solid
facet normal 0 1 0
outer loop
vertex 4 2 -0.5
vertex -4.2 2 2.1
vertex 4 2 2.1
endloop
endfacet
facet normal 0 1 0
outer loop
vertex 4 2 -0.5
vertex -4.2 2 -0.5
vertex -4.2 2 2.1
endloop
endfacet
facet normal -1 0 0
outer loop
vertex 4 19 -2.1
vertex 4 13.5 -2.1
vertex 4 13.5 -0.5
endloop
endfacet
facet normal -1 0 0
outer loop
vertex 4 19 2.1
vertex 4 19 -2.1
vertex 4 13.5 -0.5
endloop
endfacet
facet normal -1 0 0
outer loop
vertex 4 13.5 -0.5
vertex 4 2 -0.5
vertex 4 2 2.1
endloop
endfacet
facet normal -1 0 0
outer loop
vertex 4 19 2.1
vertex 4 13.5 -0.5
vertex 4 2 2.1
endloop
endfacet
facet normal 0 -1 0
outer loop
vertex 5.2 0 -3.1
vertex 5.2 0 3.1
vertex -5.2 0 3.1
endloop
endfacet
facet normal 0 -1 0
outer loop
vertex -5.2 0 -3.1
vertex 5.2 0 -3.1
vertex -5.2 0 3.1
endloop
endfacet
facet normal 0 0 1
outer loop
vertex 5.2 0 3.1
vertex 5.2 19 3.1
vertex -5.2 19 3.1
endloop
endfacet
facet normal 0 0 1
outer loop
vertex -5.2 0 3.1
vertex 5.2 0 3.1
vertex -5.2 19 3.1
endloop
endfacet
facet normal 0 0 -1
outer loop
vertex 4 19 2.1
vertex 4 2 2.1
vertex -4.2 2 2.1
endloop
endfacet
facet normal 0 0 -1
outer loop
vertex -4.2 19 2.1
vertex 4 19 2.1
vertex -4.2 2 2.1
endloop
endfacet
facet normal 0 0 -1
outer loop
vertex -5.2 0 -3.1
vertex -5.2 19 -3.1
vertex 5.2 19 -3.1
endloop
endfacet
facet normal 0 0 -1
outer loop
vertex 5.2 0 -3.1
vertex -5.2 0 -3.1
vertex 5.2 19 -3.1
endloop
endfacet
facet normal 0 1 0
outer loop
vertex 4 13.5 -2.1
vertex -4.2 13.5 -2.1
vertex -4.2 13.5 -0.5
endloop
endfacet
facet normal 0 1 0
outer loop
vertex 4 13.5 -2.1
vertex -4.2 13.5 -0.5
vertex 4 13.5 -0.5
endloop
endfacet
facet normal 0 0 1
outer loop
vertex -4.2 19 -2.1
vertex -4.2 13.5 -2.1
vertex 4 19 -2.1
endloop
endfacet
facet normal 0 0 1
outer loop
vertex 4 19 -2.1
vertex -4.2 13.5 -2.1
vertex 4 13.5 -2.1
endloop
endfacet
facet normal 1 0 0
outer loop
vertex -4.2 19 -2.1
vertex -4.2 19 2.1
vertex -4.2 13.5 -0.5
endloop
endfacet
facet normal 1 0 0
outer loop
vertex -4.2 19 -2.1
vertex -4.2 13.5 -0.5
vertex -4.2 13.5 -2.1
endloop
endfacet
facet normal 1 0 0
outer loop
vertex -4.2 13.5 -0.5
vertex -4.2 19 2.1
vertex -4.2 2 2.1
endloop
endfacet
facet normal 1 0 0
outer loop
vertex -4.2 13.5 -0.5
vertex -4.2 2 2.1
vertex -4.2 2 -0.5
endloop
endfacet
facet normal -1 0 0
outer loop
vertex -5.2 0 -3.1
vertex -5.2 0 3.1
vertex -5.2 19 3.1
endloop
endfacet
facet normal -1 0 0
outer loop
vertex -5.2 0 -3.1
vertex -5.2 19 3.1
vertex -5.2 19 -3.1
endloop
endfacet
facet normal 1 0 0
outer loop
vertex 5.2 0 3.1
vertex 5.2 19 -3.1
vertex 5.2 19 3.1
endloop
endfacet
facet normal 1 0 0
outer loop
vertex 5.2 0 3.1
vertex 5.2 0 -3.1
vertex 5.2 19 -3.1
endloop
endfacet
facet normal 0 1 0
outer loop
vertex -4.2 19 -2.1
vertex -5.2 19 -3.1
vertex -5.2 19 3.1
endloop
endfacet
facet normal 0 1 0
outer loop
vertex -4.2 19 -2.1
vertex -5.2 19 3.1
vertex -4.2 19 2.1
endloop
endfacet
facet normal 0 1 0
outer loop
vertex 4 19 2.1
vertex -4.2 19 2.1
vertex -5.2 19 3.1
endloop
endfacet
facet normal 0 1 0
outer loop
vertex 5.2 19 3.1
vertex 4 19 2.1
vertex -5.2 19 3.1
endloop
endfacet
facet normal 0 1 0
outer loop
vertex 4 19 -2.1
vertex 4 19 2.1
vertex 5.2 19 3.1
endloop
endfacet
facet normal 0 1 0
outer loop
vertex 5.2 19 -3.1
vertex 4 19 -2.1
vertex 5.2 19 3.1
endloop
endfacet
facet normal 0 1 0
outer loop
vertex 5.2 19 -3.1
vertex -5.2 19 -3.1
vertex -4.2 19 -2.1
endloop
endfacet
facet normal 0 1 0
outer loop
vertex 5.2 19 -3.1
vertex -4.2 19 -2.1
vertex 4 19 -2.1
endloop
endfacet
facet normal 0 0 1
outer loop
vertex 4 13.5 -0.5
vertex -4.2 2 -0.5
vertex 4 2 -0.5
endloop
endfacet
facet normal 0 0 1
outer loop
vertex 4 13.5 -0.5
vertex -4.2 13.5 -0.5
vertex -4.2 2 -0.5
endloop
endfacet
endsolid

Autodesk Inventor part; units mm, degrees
ref_plane "YZ Plane" through (0, 0, 0) normal (1, 0, 0) x (0, 1, 0)
ref_plane "XZ Plane" through (0, 0, 0) normal (0, 1, 0) x (-1, 0, 0)
ref_plane "XY Plane" through (0, 0, 0) normal (0, 0, 1) x (1, 0, 0)
sketch "Sketch2" plane through (0, 0, 0) normal (0, 1, 0) x (-1, 0, 0)
  line L0 (-5.2, -3.1) -> (5.2, -3.1)
  line L1 (5.2, -3.1) -> (5.2, 3.1)
  line L2 (5.2, 3.1) -> (-5.2, 3.1)
  line L3 (-5.2, 3.1) -> (-5.2, -3.1)
  line L4 (-5.2, -3.1) -> (5.2, 3.1) construction
  line L5 (5.2, -3.1) -> (-5.2, 3.1) construction
  point P0 (0, 0)
  dimension "d10" = 10.4
  dimension "d11" = 6.2
extrude "Extrusion1" add sketch "Sketch2" along normal blind 14
sketch "Sketch3" plane through (0, 14, 0) normal (0, 1, 0) x (1, 0, 0)
  line L0 (5.2, 3.1) -> (-5.2, 3.1) projected
  line L1 (-5.2, 3.1) -> (-5.2, -3.1) projected
  line L2 (-4.2, 2.1) -> (4, 2.1)
  line L3 (4, 2.1) -> (4, 0.5)
  line L4 (4, 0.5) -> (-4.2, 0.5)
  line L5 (-4.2, 0.5) -> (-4.2, 2.1)
  point P0 (0, 0)
  dimension "d14" = 8.2
  dimension "d15" = 1.6
  dimension "d16" = 1
  dimension "d17" = 1
extrude "Extrusion2" cut sketch "Sketch3" against normal blind 0.5
sketch "Sketch4" plane through (0, 14, 0) normal (0, 1, 0) x (1, 0, 0)
  line L0 (-4.2, 2.1) -> (4, 2.1) projected
  line L1 (-5.2, -3.1) -> (5.2, -3.1) projected
  line L2 (-4.2, 0.5) -> (4, 0.5)
  line L3 (4, 0.5) -> (4, -2.1)
  line L4 (4, -2.1) -> (-4.2, -2.1)
  line L5 (-4.2, -2.1) -> (-4.2, 0.5)
  point P0 (0, 0)
  dimension "d20" = 1
extrude "Extrusion3" cut sketch "Sketch4" against normal blind 12
sketch "Sketch5" plane through (0, 14, 0) normal (0, 1, 0) x (1, 0, 0)
  line L0 (-5.2, 3.1) -> (5.2, 3.1)
  line L1 (5.2, 3.1) -> (5.2, -3.1)
  line L2 (5.2, -3.1) -> (-5.2, -3.1)
  line L3 (-5.2, -3.1) -> (-5.2, 3.1)
  line L4 (4, -2.1) -> (-4.2, -2.1)
  line L5 (-4.2, -2.1) -> (-4.2, 2.1)
  line L6 (-4.2, 2.1) -> (4, 2.1)
  line L7 (4, 2.1) -> (4, -2.1)
  point P0 (0, 0)
extrude "Extrusion4" add sketch "Sketch5" along normal blind 5
properties part number "test"
